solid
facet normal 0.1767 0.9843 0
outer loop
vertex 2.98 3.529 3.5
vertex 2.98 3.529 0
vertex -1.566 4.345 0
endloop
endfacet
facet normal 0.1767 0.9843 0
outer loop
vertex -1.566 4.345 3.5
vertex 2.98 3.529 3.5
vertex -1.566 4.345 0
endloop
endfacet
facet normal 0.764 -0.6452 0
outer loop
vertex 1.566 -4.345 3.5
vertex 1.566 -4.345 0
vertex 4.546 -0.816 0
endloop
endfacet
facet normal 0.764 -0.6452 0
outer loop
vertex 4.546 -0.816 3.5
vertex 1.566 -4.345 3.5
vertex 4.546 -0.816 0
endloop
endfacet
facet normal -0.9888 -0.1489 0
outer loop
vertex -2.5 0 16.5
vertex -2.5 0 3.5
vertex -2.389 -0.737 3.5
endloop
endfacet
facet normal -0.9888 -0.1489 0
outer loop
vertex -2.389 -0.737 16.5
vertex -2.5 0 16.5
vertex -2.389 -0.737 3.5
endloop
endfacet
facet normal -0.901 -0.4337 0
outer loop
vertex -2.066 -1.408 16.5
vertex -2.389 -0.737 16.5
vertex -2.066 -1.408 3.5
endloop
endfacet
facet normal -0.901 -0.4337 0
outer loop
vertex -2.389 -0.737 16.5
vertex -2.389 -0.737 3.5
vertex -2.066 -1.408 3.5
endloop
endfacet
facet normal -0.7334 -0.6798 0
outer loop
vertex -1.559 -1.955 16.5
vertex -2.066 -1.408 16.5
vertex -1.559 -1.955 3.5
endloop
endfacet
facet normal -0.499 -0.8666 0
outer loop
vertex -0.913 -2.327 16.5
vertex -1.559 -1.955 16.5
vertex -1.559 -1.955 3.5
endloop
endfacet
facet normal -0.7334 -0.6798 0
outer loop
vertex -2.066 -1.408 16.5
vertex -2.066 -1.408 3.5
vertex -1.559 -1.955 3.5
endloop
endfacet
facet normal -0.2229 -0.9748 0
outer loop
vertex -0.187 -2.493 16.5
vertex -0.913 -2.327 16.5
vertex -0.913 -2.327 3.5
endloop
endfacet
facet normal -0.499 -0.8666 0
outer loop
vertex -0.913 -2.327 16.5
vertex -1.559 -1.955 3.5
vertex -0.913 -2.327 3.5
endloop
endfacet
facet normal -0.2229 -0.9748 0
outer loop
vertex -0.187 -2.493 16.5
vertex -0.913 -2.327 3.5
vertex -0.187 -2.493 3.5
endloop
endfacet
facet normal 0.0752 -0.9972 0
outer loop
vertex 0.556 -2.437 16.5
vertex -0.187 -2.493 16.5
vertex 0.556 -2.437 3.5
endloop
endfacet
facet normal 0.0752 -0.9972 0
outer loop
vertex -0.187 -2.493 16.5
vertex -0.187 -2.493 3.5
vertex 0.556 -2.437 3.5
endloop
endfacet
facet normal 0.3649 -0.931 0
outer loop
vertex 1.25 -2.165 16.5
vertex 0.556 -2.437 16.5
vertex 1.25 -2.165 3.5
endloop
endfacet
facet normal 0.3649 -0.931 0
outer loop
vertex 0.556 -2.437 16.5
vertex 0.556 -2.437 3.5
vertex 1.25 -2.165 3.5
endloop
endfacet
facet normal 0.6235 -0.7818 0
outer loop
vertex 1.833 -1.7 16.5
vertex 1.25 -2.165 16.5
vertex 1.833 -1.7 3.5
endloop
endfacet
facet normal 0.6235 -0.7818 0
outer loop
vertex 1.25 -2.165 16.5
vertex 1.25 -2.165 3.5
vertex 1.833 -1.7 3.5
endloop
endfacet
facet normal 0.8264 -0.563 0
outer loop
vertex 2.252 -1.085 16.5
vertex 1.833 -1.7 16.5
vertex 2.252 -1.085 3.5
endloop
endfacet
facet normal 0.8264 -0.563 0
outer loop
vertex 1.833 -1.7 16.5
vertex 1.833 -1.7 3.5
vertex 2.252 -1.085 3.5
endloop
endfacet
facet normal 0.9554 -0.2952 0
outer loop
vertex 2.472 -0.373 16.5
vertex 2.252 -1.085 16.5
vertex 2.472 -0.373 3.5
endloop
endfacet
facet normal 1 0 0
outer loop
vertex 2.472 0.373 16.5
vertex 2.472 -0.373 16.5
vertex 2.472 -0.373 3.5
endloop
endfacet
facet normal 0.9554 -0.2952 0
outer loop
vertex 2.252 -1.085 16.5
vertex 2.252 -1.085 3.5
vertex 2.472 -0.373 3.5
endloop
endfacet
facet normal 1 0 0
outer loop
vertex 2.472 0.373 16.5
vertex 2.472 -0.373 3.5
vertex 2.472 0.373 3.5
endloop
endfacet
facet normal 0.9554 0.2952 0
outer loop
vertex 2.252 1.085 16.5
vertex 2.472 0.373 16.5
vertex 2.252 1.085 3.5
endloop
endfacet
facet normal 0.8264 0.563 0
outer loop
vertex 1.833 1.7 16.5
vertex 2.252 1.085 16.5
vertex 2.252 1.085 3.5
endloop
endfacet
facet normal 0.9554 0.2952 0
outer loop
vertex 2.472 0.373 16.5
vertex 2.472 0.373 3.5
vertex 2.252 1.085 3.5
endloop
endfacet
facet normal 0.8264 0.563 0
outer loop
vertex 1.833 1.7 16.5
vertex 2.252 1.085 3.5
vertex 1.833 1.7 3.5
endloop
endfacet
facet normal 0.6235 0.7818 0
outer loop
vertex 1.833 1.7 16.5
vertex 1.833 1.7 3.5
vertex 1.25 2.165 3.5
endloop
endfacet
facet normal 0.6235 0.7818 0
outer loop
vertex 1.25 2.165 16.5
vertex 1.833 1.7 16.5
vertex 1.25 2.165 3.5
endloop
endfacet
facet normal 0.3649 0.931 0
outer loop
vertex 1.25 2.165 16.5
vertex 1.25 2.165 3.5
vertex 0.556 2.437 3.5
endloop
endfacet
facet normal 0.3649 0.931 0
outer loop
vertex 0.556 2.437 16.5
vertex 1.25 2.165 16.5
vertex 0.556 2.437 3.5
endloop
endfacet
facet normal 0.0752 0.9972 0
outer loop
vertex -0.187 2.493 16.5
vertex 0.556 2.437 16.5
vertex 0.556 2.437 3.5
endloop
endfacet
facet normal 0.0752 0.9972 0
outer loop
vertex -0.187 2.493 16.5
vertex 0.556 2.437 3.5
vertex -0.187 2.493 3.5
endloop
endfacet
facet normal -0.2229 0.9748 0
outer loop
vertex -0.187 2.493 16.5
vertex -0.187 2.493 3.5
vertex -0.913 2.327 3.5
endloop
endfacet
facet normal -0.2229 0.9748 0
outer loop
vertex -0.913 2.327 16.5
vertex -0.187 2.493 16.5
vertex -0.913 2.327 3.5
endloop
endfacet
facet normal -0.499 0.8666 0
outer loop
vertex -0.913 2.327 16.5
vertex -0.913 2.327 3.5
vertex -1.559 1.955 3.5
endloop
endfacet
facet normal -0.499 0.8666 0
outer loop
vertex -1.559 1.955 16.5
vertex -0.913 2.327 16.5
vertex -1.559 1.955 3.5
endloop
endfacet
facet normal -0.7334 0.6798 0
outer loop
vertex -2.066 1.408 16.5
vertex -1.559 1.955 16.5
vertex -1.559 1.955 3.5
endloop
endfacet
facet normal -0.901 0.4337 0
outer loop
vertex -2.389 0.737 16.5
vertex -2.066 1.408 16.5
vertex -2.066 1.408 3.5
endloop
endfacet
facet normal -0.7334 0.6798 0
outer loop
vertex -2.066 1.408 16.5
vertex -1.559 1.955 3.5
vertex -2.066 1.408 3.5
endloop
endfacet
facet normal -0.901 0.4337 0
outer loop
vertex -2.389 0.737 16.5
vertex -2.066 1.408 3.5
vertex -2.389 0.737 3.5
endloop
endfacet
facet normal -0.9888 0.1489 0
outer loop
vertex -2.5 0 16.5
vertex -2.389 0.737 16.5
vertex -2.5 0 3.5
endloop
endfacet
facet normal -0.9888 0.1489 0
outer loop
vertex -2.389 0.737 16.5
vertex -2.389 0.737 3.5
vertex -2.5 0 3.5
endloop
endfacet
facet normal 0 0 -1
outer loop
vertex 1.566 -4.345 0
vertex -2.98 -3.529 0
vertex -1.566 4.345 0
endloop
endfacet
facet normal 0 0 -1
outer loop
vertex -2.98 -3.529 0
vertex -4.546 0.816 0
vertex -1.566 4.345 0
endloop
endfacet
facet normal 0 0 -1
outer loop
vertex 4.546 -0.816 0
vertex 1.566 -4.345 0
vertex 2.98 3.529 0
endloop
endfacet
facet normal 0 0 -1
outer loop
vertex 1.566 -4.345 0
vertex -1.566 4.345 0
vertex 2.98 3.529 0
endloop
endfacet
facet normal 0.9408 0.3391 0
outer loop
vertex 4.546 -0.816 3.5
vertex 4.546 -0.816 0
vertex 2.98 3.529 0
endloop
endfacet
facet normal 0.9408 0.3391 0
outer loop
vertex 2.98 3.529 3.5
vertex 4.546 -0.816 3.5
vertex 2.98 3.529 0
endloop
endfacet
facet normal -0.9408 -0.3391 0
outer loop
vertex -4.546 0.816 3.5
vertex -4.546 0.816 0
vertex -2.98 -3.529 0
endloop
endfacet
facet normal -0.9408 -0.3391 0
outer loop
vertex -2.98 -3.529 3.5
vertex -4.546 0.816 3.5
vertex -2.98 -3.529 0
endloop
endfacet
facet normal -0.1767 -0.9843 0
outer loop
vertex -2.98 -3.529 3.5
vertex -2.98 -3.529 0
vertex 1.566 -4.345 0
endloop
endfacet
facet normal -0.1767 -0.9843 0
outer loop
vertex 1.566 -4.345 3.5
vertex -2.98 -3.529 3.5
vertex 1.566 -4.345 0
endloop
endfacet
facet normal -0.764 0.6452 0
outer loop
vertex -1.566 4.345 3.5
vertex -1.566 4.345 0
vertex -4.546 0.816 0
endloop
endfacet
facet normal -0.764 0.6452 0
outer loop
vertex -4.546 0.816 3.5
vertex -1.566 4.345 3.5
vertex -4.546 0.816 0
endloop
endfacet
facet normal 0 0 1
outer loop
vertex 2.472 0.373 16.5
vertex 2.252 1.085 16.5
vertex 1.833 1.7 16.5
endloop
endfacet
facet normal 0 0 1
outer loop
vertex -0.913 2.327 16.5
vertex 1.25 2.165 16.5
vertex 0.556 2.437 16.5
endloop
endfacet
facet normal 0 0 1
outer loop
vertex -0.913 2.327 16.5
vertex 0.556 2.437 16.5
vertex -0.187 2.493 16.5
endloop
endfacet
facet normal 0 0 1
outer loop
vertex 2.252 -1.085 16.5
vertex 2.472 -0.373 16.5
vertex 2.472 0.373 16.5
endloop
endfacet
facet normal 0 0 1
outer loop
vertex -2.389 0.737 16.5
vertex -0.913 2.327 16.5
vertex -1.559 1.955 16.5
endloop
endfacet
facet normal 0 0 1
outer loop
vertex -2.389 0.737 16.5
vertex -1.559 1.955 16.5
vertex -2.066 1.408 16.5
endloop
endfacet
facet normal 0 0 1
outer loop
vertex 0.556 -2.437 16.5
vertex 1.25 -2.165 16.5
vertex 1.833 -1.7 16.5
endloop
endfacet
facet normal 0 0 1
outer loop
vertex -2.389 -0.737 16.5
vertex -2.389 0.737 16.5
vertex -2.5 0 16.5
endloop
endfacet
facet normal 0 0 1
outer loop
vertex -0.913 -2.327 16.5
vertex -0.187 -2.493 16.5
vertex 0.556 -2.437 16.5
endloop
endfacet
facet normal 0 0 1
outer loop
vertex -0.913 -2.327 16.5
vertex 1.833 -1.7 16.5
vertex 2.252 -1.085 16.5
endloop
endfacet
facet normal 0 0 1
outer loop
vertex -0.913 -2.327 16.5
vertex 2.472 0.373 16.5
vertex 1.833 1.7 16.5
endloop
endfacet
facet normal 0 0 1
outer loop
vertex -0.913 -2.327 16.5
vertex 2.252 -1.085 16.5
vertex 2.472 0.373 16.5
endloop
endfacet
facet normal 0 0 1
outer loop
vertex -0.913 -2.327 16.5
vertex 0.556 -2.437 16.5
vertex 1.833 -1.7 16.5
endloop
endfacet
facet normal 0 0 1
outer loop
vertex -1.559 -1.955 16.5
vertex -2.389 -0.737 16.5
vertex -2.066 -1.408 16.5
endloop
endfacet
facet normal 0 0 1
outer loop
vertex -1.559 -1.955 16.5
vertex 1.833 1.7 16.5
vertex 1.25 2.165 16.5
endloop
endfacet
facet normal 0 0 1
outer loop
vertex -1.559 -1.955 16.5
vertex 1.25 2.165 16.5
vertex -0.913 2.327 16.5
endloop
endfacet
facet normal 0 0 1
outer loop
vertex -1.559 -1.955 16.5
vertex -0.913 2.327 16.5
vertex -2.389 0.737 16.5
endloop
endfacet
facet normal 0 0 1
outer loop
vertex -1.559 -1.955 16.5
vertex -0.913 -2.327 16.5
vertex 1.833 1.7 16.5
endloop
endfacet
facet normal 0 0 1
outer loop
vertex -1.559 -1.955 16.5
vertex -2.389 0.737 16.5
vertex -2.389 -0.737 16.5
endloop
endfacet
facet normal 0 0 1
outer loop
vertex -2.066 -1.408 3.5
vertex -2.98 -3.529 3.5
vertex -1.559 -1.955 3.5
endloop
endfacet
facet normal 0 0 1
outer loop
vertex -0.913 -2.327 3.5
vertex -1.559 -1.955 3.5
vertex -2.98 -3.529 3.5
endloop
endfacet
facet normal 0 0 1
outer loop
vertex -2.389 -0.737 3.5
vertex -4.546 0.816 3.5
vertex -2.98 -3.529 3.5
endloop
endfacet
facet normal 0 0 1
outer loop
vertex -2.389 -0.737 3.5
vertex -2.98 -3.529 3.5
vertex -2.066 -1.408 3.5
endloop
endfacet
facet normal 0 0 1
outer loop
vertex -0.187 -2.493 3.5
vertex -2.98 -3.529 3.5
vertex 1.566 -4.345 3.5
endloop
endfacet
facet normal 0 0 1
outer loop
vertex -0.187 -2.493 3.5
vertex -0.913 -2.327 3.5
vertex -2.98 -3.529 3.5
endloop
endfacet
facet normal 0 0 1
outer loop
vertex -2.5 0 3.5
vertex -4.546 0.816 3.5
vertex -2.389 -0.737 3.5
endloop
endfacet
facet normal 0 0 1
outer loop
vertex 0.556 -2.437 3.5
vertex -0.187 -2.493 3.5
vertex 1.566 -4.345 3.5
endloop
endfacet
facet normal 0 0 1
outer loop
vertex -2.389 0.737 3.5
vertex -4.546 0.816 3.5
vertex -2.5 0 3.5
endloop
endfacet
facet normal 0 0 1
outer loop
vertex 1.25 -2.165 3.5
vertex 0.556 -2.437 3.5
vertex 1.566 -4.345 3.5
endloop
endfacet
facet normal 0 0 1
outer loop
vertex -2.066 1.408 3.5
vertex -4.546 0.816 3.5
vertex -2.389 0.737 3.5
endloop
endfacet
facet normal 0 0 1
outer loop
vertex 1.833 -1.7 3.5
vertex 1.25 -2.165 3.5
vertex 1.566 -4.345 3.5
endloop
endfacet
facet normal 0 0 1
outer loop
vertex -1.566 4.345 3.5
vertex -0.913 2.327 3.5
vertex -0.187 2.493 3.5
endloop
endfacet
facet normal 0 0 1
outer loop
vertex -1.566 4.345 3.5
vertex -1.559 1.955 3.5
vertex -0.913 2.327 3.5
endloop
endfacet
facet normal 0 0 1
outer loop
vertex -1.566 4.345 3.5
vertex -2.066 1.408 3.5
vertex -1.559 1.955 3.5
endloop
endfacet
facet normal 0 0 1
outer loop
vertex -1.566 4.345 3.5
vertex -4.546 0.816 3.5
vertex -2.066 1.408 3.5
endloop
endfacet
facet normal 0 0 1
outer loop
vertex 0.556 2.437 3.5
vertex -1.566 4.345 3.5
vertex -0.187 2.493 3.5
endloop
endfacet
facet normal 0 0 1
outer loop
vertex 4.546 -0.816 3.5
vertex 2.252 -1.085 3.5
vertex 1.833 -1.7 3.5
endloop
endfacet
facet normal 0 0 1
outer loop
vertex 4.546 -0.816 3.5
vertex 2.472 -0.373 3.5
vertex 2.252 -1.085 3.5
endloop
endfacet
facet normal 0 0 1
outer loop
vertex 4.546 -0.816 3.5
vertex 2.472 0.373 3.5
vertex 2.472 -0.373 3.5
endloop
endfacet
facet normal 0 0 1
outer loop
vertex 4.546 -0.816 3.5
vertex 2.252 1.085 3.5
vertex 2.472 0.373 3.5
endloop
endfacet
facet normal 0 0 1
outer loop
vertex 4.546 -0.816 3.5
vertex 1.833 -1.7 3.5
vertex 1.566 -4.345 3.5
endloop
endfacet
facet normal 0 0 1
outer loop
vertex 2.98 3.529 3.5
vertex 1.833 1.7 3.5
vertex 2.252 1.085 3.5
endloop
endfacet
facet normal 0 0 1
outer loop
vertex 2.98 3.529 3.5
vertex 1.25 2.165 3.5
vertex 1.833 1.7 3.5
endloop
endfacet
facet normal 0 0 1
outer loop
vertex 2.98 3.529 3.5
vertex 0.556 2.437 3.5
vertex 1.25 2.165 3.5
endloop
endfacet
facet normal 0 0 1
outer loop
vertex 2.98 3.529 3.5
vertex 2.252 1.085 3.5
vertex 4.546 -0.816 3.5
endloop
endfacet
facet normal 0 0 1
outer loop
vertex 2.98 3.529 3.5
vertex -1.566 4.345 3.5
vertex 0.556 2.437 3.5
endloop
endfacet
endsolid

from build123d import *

# Parameters (mm, degrees)
EXTRUDE_1_DEPTH = 3.5
SKETCH_2_R      = 2.5
EXTRUDE_2_DEPTH = 13


with BuildPart() as part:
    # ｽｹｯﾁ1 → ﾎﾞｽ - 押し出し1 (new body)
    with BuildSketch(Plane.XY):
        Polygon((-2.979795067, -3.529044445), (1.566344606, -4.345100448), (4.546139674, -0.816056004), (2.979795067, 3.529044445), (-1.566344606, 4.345100448), (-4.546139674, 0.816056004), align=None)
    extrude(amount=EXTRUDE_1_DEPTH)

    # ｽｹｯﾁ2 → ﾎﾞｽ - 押し出し2 (add)
    with BuildSketch(Plane.XY.offset(3.5)):
        with Locations(Location((0, 0, 0), (0, 0, 180))):
            Circle(SKETCH_2_R)
    extrude(amount=EXTRUDE_2_DEPTH)


solid = part.part
